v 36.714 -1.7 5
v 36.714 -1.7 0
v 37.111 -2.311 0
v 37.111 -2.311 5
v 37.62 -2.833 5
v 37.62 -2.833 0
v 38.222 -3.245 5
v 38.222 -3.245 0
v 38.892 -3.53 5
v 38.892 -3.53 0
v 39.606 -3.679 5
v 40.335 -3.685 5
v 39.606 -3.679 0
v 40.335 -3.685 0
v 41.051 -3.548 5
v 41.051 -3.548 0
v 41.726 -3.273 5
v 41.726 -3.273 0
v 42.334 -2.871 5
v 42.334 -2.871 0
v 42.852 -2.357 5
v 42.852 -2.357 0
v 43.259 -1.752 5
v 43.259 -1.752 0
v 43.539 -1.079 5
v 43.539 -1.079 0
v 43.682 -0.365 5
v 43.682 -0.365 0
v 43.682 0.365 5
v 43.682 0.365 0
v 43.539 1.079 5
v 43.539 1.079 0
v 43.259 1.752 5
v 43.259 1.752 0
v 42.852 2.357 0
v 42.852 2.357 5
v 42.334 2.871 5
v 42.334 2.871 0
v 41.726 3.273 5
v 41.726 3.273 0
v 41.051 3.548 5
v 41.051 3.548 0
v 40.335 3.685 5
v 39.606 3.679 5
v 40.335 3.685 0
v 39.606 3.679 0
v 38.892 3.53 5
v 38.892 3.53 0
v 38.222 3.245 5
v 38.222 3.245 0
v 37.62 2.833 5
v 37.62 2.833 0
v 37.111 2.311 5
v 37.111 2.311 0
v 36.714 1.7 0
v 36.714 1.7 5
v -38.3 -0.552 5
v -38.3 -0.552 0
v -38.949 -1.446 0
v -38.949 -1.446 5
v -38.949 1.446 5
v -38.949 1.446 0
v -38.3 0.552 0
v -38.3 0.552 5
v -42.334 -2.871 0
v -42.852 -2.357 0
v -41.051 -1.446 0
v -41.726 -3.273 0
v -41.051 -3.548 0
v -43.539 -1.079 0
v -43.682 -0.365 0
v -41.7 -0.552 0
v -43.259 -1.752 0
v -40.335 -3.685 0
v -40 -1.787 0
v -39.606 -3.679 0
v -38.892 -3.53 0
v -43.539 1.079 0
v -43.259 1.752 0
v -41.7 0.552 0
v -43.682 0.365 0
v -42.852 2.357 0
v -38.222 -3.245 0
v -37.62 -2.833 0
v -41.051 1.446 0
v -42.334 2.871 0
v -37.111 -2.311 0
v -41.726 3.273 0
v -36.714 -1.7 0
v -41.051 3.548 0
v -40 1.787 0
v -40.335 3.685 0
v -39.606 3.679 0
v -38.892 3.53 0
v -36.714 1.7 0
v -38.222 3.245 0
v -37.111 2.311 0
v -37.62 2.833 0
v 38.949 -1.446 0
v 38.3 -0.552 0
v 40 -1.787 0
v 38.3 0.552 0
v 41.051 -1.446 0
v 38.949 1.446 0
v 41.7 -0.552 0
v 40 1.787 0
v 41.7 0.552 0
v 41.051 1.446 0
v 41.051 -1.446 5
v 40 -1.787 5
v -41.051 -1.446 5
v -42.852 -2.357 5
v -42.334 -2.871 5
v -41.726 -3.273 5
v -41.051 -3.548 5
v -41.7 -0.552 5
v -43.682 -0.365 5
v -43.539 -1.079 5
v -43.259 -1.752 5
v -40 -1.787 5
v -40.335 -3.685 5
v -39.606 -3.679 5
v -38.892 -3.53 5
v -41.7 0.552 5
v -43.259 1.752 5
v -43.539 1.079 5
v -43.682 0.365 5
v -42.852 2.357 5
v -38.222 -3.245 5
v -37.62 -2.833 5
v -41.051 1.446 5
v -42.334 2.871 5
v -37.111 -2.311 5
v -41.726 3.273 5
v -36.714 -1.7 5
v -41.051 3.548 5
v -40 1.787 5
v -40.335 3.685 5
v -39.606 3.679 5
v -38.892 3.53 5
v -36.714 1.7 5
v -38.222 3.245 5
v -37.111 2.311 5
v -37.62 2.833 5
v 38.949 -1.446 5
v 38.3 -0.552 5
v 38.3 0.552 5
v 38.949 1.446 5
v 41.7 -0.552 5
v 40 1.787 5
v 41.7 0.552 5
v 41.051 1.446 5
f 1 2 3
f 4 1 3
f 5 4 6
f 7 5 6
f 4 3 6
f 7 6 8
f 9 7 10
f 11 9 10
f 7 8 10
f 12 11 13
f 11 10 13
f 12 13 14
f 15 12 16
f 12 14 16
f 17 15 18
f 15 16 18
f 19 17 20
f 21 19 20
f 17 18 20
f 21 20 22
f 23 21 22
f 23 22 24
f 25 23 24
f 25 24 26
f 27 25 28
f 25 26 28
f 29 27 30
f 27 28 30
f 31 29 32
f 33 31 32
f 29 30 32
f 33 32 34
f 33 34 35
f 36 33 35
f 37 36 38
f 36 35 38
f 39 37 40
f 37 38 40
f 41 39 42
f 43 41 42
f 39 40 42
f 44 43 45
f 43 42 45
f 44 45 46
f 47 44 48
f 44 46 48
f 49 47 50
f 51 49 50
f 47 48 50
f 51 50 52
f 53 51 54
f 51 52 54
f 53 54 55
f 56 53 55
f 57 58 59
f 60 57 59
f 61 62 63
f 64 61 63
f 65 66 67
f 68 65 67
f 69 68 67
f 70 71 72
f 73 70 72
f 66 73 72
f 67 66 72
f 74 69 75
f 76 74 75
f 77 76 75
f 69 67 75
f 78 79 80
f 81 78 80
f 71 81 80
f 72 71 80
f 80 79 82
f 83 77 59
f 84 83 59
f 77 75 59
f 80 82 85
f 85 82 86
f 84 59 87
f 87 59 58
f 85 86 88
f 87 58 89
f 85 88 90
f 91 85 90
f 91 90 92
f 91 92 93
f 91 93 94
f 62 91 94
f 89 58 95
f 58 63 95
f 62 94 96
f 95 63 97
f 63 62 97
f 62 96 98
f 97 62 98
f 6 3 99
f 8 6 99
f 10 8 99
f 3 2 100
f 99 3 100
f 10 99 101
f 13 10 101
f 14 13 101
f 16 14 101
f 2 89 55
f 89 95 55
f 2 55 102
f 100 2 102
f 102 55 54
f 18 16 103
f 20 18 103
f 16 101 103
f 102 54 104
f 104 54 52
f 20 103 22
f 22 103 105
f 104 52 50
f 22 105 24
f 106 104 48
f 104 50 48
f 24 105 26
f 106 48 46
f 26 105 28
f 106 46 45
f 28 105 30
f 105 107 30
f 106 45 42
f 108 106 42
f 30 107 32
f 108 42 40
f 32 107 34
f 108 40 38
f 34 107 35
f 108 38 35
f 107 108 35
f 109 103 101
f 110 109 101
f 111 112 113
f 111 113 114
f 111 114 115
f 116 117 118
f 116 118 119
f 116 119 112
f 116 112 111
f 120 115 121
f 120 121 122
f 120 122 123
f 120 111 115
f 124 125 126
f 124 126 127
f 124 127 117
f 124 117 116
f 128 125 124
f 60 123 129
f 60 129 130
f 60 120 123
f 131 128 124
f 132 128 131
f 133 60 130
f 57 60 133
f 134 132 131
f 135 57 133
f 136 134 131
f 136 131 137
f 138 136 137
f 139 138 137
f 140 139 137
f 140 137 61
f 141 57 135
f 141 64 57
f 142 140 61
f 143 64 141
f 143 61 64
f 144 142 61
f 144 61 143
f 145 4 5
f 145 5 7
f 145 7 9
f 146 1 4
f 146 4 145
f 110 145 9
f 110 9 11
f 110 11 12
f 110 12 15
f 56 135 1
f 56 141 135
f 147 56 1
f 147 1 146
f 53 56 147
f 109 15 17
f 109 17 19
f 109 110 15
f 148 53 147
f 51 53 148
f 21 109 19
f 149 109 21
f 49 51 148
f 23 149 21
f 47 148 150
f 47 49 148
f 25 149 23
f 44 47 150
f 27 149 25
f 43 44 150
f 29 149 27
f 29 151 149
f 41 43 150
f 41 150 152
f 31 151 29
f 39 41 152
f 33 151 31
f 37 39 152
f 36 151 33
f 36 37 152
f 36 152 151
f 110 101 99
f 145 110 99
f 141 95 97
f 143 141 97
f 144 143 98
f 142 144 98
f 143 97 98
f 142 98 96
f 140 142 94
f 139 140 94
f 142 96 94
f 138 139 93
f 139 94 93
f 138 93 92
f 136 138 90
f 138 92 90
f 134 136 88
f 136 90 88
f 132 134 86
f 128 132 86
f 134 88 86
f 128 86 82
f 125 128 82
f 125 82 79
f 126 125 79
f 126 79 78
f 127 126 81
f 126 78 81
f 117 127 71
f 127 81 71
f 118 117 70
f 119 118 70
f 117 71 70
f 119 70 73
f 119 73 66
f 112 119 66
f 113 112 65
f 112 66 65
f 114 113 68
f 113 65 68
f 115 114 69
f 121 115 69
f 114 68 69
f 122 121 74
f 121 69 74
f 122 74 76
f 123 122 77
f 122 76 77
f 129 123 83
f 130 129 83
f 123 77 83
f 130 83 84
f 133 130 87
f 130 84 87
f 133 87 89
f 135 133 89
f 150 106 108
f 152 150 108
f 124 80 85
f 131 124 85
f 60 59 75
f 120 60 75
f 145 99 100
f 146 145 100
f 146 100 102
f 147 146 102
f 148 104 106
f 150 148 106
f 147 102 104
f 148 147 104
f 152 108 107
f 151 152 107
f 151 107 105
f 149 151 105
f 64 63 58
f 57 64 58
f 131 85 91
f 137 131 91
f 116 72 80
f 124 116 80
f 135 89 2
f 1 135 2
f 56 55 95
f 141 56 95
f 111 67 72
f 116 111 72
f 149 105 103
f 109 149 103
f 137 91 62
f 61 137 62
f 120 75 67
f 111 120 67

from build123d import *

# Parameters (mm, degrees)
F1_DEPTH = 5


with BuildPart() as f1:
    # F0 (on Top) → F1 (new body)
    with BuildSketch(Plane.XY):
        with BuildLine():
            Line((36.713665, 1.7), (-36.713665, 1.7))
            ThreePointArc((-36.713665, 1.7), (-43.7, 0), (-36.713665, -1.7))
            Line((-36.713665, -1.7), (36.713665, -1.7))
            ThreePointArc((36.713665, -1.7), (43.7, 0), (36.713665, 1.7))
        make_face()
        Polygon((-41.050658, -1.446106), (-41.7, -0.552363), (-41.7, 0.552363), (-41.050658, 1.446106), (-40, 1.787486), (-38.949342, 1.446106), (-38.3, 0.552363), (-38.3, -0.552363), (-38.949342, -1.446106), (-40, -1.787486), align=None, mode=Mode.SUBTRACT)
        Polygon((41.050658, 1.446106), (41.7, 0.552363), (41.7, -0.552363), (41.050658, -1.446106), (40, -1.787486), (38.949342, -1.446106), (38.3, -0.552363), (38.3, 0.552363), (38.949342, 1.446106), (40, 1.787486), align=None, mode=Mode.SUBTRACT)
    extrude(amount=F1_DEPTH)


solid = f1.part
